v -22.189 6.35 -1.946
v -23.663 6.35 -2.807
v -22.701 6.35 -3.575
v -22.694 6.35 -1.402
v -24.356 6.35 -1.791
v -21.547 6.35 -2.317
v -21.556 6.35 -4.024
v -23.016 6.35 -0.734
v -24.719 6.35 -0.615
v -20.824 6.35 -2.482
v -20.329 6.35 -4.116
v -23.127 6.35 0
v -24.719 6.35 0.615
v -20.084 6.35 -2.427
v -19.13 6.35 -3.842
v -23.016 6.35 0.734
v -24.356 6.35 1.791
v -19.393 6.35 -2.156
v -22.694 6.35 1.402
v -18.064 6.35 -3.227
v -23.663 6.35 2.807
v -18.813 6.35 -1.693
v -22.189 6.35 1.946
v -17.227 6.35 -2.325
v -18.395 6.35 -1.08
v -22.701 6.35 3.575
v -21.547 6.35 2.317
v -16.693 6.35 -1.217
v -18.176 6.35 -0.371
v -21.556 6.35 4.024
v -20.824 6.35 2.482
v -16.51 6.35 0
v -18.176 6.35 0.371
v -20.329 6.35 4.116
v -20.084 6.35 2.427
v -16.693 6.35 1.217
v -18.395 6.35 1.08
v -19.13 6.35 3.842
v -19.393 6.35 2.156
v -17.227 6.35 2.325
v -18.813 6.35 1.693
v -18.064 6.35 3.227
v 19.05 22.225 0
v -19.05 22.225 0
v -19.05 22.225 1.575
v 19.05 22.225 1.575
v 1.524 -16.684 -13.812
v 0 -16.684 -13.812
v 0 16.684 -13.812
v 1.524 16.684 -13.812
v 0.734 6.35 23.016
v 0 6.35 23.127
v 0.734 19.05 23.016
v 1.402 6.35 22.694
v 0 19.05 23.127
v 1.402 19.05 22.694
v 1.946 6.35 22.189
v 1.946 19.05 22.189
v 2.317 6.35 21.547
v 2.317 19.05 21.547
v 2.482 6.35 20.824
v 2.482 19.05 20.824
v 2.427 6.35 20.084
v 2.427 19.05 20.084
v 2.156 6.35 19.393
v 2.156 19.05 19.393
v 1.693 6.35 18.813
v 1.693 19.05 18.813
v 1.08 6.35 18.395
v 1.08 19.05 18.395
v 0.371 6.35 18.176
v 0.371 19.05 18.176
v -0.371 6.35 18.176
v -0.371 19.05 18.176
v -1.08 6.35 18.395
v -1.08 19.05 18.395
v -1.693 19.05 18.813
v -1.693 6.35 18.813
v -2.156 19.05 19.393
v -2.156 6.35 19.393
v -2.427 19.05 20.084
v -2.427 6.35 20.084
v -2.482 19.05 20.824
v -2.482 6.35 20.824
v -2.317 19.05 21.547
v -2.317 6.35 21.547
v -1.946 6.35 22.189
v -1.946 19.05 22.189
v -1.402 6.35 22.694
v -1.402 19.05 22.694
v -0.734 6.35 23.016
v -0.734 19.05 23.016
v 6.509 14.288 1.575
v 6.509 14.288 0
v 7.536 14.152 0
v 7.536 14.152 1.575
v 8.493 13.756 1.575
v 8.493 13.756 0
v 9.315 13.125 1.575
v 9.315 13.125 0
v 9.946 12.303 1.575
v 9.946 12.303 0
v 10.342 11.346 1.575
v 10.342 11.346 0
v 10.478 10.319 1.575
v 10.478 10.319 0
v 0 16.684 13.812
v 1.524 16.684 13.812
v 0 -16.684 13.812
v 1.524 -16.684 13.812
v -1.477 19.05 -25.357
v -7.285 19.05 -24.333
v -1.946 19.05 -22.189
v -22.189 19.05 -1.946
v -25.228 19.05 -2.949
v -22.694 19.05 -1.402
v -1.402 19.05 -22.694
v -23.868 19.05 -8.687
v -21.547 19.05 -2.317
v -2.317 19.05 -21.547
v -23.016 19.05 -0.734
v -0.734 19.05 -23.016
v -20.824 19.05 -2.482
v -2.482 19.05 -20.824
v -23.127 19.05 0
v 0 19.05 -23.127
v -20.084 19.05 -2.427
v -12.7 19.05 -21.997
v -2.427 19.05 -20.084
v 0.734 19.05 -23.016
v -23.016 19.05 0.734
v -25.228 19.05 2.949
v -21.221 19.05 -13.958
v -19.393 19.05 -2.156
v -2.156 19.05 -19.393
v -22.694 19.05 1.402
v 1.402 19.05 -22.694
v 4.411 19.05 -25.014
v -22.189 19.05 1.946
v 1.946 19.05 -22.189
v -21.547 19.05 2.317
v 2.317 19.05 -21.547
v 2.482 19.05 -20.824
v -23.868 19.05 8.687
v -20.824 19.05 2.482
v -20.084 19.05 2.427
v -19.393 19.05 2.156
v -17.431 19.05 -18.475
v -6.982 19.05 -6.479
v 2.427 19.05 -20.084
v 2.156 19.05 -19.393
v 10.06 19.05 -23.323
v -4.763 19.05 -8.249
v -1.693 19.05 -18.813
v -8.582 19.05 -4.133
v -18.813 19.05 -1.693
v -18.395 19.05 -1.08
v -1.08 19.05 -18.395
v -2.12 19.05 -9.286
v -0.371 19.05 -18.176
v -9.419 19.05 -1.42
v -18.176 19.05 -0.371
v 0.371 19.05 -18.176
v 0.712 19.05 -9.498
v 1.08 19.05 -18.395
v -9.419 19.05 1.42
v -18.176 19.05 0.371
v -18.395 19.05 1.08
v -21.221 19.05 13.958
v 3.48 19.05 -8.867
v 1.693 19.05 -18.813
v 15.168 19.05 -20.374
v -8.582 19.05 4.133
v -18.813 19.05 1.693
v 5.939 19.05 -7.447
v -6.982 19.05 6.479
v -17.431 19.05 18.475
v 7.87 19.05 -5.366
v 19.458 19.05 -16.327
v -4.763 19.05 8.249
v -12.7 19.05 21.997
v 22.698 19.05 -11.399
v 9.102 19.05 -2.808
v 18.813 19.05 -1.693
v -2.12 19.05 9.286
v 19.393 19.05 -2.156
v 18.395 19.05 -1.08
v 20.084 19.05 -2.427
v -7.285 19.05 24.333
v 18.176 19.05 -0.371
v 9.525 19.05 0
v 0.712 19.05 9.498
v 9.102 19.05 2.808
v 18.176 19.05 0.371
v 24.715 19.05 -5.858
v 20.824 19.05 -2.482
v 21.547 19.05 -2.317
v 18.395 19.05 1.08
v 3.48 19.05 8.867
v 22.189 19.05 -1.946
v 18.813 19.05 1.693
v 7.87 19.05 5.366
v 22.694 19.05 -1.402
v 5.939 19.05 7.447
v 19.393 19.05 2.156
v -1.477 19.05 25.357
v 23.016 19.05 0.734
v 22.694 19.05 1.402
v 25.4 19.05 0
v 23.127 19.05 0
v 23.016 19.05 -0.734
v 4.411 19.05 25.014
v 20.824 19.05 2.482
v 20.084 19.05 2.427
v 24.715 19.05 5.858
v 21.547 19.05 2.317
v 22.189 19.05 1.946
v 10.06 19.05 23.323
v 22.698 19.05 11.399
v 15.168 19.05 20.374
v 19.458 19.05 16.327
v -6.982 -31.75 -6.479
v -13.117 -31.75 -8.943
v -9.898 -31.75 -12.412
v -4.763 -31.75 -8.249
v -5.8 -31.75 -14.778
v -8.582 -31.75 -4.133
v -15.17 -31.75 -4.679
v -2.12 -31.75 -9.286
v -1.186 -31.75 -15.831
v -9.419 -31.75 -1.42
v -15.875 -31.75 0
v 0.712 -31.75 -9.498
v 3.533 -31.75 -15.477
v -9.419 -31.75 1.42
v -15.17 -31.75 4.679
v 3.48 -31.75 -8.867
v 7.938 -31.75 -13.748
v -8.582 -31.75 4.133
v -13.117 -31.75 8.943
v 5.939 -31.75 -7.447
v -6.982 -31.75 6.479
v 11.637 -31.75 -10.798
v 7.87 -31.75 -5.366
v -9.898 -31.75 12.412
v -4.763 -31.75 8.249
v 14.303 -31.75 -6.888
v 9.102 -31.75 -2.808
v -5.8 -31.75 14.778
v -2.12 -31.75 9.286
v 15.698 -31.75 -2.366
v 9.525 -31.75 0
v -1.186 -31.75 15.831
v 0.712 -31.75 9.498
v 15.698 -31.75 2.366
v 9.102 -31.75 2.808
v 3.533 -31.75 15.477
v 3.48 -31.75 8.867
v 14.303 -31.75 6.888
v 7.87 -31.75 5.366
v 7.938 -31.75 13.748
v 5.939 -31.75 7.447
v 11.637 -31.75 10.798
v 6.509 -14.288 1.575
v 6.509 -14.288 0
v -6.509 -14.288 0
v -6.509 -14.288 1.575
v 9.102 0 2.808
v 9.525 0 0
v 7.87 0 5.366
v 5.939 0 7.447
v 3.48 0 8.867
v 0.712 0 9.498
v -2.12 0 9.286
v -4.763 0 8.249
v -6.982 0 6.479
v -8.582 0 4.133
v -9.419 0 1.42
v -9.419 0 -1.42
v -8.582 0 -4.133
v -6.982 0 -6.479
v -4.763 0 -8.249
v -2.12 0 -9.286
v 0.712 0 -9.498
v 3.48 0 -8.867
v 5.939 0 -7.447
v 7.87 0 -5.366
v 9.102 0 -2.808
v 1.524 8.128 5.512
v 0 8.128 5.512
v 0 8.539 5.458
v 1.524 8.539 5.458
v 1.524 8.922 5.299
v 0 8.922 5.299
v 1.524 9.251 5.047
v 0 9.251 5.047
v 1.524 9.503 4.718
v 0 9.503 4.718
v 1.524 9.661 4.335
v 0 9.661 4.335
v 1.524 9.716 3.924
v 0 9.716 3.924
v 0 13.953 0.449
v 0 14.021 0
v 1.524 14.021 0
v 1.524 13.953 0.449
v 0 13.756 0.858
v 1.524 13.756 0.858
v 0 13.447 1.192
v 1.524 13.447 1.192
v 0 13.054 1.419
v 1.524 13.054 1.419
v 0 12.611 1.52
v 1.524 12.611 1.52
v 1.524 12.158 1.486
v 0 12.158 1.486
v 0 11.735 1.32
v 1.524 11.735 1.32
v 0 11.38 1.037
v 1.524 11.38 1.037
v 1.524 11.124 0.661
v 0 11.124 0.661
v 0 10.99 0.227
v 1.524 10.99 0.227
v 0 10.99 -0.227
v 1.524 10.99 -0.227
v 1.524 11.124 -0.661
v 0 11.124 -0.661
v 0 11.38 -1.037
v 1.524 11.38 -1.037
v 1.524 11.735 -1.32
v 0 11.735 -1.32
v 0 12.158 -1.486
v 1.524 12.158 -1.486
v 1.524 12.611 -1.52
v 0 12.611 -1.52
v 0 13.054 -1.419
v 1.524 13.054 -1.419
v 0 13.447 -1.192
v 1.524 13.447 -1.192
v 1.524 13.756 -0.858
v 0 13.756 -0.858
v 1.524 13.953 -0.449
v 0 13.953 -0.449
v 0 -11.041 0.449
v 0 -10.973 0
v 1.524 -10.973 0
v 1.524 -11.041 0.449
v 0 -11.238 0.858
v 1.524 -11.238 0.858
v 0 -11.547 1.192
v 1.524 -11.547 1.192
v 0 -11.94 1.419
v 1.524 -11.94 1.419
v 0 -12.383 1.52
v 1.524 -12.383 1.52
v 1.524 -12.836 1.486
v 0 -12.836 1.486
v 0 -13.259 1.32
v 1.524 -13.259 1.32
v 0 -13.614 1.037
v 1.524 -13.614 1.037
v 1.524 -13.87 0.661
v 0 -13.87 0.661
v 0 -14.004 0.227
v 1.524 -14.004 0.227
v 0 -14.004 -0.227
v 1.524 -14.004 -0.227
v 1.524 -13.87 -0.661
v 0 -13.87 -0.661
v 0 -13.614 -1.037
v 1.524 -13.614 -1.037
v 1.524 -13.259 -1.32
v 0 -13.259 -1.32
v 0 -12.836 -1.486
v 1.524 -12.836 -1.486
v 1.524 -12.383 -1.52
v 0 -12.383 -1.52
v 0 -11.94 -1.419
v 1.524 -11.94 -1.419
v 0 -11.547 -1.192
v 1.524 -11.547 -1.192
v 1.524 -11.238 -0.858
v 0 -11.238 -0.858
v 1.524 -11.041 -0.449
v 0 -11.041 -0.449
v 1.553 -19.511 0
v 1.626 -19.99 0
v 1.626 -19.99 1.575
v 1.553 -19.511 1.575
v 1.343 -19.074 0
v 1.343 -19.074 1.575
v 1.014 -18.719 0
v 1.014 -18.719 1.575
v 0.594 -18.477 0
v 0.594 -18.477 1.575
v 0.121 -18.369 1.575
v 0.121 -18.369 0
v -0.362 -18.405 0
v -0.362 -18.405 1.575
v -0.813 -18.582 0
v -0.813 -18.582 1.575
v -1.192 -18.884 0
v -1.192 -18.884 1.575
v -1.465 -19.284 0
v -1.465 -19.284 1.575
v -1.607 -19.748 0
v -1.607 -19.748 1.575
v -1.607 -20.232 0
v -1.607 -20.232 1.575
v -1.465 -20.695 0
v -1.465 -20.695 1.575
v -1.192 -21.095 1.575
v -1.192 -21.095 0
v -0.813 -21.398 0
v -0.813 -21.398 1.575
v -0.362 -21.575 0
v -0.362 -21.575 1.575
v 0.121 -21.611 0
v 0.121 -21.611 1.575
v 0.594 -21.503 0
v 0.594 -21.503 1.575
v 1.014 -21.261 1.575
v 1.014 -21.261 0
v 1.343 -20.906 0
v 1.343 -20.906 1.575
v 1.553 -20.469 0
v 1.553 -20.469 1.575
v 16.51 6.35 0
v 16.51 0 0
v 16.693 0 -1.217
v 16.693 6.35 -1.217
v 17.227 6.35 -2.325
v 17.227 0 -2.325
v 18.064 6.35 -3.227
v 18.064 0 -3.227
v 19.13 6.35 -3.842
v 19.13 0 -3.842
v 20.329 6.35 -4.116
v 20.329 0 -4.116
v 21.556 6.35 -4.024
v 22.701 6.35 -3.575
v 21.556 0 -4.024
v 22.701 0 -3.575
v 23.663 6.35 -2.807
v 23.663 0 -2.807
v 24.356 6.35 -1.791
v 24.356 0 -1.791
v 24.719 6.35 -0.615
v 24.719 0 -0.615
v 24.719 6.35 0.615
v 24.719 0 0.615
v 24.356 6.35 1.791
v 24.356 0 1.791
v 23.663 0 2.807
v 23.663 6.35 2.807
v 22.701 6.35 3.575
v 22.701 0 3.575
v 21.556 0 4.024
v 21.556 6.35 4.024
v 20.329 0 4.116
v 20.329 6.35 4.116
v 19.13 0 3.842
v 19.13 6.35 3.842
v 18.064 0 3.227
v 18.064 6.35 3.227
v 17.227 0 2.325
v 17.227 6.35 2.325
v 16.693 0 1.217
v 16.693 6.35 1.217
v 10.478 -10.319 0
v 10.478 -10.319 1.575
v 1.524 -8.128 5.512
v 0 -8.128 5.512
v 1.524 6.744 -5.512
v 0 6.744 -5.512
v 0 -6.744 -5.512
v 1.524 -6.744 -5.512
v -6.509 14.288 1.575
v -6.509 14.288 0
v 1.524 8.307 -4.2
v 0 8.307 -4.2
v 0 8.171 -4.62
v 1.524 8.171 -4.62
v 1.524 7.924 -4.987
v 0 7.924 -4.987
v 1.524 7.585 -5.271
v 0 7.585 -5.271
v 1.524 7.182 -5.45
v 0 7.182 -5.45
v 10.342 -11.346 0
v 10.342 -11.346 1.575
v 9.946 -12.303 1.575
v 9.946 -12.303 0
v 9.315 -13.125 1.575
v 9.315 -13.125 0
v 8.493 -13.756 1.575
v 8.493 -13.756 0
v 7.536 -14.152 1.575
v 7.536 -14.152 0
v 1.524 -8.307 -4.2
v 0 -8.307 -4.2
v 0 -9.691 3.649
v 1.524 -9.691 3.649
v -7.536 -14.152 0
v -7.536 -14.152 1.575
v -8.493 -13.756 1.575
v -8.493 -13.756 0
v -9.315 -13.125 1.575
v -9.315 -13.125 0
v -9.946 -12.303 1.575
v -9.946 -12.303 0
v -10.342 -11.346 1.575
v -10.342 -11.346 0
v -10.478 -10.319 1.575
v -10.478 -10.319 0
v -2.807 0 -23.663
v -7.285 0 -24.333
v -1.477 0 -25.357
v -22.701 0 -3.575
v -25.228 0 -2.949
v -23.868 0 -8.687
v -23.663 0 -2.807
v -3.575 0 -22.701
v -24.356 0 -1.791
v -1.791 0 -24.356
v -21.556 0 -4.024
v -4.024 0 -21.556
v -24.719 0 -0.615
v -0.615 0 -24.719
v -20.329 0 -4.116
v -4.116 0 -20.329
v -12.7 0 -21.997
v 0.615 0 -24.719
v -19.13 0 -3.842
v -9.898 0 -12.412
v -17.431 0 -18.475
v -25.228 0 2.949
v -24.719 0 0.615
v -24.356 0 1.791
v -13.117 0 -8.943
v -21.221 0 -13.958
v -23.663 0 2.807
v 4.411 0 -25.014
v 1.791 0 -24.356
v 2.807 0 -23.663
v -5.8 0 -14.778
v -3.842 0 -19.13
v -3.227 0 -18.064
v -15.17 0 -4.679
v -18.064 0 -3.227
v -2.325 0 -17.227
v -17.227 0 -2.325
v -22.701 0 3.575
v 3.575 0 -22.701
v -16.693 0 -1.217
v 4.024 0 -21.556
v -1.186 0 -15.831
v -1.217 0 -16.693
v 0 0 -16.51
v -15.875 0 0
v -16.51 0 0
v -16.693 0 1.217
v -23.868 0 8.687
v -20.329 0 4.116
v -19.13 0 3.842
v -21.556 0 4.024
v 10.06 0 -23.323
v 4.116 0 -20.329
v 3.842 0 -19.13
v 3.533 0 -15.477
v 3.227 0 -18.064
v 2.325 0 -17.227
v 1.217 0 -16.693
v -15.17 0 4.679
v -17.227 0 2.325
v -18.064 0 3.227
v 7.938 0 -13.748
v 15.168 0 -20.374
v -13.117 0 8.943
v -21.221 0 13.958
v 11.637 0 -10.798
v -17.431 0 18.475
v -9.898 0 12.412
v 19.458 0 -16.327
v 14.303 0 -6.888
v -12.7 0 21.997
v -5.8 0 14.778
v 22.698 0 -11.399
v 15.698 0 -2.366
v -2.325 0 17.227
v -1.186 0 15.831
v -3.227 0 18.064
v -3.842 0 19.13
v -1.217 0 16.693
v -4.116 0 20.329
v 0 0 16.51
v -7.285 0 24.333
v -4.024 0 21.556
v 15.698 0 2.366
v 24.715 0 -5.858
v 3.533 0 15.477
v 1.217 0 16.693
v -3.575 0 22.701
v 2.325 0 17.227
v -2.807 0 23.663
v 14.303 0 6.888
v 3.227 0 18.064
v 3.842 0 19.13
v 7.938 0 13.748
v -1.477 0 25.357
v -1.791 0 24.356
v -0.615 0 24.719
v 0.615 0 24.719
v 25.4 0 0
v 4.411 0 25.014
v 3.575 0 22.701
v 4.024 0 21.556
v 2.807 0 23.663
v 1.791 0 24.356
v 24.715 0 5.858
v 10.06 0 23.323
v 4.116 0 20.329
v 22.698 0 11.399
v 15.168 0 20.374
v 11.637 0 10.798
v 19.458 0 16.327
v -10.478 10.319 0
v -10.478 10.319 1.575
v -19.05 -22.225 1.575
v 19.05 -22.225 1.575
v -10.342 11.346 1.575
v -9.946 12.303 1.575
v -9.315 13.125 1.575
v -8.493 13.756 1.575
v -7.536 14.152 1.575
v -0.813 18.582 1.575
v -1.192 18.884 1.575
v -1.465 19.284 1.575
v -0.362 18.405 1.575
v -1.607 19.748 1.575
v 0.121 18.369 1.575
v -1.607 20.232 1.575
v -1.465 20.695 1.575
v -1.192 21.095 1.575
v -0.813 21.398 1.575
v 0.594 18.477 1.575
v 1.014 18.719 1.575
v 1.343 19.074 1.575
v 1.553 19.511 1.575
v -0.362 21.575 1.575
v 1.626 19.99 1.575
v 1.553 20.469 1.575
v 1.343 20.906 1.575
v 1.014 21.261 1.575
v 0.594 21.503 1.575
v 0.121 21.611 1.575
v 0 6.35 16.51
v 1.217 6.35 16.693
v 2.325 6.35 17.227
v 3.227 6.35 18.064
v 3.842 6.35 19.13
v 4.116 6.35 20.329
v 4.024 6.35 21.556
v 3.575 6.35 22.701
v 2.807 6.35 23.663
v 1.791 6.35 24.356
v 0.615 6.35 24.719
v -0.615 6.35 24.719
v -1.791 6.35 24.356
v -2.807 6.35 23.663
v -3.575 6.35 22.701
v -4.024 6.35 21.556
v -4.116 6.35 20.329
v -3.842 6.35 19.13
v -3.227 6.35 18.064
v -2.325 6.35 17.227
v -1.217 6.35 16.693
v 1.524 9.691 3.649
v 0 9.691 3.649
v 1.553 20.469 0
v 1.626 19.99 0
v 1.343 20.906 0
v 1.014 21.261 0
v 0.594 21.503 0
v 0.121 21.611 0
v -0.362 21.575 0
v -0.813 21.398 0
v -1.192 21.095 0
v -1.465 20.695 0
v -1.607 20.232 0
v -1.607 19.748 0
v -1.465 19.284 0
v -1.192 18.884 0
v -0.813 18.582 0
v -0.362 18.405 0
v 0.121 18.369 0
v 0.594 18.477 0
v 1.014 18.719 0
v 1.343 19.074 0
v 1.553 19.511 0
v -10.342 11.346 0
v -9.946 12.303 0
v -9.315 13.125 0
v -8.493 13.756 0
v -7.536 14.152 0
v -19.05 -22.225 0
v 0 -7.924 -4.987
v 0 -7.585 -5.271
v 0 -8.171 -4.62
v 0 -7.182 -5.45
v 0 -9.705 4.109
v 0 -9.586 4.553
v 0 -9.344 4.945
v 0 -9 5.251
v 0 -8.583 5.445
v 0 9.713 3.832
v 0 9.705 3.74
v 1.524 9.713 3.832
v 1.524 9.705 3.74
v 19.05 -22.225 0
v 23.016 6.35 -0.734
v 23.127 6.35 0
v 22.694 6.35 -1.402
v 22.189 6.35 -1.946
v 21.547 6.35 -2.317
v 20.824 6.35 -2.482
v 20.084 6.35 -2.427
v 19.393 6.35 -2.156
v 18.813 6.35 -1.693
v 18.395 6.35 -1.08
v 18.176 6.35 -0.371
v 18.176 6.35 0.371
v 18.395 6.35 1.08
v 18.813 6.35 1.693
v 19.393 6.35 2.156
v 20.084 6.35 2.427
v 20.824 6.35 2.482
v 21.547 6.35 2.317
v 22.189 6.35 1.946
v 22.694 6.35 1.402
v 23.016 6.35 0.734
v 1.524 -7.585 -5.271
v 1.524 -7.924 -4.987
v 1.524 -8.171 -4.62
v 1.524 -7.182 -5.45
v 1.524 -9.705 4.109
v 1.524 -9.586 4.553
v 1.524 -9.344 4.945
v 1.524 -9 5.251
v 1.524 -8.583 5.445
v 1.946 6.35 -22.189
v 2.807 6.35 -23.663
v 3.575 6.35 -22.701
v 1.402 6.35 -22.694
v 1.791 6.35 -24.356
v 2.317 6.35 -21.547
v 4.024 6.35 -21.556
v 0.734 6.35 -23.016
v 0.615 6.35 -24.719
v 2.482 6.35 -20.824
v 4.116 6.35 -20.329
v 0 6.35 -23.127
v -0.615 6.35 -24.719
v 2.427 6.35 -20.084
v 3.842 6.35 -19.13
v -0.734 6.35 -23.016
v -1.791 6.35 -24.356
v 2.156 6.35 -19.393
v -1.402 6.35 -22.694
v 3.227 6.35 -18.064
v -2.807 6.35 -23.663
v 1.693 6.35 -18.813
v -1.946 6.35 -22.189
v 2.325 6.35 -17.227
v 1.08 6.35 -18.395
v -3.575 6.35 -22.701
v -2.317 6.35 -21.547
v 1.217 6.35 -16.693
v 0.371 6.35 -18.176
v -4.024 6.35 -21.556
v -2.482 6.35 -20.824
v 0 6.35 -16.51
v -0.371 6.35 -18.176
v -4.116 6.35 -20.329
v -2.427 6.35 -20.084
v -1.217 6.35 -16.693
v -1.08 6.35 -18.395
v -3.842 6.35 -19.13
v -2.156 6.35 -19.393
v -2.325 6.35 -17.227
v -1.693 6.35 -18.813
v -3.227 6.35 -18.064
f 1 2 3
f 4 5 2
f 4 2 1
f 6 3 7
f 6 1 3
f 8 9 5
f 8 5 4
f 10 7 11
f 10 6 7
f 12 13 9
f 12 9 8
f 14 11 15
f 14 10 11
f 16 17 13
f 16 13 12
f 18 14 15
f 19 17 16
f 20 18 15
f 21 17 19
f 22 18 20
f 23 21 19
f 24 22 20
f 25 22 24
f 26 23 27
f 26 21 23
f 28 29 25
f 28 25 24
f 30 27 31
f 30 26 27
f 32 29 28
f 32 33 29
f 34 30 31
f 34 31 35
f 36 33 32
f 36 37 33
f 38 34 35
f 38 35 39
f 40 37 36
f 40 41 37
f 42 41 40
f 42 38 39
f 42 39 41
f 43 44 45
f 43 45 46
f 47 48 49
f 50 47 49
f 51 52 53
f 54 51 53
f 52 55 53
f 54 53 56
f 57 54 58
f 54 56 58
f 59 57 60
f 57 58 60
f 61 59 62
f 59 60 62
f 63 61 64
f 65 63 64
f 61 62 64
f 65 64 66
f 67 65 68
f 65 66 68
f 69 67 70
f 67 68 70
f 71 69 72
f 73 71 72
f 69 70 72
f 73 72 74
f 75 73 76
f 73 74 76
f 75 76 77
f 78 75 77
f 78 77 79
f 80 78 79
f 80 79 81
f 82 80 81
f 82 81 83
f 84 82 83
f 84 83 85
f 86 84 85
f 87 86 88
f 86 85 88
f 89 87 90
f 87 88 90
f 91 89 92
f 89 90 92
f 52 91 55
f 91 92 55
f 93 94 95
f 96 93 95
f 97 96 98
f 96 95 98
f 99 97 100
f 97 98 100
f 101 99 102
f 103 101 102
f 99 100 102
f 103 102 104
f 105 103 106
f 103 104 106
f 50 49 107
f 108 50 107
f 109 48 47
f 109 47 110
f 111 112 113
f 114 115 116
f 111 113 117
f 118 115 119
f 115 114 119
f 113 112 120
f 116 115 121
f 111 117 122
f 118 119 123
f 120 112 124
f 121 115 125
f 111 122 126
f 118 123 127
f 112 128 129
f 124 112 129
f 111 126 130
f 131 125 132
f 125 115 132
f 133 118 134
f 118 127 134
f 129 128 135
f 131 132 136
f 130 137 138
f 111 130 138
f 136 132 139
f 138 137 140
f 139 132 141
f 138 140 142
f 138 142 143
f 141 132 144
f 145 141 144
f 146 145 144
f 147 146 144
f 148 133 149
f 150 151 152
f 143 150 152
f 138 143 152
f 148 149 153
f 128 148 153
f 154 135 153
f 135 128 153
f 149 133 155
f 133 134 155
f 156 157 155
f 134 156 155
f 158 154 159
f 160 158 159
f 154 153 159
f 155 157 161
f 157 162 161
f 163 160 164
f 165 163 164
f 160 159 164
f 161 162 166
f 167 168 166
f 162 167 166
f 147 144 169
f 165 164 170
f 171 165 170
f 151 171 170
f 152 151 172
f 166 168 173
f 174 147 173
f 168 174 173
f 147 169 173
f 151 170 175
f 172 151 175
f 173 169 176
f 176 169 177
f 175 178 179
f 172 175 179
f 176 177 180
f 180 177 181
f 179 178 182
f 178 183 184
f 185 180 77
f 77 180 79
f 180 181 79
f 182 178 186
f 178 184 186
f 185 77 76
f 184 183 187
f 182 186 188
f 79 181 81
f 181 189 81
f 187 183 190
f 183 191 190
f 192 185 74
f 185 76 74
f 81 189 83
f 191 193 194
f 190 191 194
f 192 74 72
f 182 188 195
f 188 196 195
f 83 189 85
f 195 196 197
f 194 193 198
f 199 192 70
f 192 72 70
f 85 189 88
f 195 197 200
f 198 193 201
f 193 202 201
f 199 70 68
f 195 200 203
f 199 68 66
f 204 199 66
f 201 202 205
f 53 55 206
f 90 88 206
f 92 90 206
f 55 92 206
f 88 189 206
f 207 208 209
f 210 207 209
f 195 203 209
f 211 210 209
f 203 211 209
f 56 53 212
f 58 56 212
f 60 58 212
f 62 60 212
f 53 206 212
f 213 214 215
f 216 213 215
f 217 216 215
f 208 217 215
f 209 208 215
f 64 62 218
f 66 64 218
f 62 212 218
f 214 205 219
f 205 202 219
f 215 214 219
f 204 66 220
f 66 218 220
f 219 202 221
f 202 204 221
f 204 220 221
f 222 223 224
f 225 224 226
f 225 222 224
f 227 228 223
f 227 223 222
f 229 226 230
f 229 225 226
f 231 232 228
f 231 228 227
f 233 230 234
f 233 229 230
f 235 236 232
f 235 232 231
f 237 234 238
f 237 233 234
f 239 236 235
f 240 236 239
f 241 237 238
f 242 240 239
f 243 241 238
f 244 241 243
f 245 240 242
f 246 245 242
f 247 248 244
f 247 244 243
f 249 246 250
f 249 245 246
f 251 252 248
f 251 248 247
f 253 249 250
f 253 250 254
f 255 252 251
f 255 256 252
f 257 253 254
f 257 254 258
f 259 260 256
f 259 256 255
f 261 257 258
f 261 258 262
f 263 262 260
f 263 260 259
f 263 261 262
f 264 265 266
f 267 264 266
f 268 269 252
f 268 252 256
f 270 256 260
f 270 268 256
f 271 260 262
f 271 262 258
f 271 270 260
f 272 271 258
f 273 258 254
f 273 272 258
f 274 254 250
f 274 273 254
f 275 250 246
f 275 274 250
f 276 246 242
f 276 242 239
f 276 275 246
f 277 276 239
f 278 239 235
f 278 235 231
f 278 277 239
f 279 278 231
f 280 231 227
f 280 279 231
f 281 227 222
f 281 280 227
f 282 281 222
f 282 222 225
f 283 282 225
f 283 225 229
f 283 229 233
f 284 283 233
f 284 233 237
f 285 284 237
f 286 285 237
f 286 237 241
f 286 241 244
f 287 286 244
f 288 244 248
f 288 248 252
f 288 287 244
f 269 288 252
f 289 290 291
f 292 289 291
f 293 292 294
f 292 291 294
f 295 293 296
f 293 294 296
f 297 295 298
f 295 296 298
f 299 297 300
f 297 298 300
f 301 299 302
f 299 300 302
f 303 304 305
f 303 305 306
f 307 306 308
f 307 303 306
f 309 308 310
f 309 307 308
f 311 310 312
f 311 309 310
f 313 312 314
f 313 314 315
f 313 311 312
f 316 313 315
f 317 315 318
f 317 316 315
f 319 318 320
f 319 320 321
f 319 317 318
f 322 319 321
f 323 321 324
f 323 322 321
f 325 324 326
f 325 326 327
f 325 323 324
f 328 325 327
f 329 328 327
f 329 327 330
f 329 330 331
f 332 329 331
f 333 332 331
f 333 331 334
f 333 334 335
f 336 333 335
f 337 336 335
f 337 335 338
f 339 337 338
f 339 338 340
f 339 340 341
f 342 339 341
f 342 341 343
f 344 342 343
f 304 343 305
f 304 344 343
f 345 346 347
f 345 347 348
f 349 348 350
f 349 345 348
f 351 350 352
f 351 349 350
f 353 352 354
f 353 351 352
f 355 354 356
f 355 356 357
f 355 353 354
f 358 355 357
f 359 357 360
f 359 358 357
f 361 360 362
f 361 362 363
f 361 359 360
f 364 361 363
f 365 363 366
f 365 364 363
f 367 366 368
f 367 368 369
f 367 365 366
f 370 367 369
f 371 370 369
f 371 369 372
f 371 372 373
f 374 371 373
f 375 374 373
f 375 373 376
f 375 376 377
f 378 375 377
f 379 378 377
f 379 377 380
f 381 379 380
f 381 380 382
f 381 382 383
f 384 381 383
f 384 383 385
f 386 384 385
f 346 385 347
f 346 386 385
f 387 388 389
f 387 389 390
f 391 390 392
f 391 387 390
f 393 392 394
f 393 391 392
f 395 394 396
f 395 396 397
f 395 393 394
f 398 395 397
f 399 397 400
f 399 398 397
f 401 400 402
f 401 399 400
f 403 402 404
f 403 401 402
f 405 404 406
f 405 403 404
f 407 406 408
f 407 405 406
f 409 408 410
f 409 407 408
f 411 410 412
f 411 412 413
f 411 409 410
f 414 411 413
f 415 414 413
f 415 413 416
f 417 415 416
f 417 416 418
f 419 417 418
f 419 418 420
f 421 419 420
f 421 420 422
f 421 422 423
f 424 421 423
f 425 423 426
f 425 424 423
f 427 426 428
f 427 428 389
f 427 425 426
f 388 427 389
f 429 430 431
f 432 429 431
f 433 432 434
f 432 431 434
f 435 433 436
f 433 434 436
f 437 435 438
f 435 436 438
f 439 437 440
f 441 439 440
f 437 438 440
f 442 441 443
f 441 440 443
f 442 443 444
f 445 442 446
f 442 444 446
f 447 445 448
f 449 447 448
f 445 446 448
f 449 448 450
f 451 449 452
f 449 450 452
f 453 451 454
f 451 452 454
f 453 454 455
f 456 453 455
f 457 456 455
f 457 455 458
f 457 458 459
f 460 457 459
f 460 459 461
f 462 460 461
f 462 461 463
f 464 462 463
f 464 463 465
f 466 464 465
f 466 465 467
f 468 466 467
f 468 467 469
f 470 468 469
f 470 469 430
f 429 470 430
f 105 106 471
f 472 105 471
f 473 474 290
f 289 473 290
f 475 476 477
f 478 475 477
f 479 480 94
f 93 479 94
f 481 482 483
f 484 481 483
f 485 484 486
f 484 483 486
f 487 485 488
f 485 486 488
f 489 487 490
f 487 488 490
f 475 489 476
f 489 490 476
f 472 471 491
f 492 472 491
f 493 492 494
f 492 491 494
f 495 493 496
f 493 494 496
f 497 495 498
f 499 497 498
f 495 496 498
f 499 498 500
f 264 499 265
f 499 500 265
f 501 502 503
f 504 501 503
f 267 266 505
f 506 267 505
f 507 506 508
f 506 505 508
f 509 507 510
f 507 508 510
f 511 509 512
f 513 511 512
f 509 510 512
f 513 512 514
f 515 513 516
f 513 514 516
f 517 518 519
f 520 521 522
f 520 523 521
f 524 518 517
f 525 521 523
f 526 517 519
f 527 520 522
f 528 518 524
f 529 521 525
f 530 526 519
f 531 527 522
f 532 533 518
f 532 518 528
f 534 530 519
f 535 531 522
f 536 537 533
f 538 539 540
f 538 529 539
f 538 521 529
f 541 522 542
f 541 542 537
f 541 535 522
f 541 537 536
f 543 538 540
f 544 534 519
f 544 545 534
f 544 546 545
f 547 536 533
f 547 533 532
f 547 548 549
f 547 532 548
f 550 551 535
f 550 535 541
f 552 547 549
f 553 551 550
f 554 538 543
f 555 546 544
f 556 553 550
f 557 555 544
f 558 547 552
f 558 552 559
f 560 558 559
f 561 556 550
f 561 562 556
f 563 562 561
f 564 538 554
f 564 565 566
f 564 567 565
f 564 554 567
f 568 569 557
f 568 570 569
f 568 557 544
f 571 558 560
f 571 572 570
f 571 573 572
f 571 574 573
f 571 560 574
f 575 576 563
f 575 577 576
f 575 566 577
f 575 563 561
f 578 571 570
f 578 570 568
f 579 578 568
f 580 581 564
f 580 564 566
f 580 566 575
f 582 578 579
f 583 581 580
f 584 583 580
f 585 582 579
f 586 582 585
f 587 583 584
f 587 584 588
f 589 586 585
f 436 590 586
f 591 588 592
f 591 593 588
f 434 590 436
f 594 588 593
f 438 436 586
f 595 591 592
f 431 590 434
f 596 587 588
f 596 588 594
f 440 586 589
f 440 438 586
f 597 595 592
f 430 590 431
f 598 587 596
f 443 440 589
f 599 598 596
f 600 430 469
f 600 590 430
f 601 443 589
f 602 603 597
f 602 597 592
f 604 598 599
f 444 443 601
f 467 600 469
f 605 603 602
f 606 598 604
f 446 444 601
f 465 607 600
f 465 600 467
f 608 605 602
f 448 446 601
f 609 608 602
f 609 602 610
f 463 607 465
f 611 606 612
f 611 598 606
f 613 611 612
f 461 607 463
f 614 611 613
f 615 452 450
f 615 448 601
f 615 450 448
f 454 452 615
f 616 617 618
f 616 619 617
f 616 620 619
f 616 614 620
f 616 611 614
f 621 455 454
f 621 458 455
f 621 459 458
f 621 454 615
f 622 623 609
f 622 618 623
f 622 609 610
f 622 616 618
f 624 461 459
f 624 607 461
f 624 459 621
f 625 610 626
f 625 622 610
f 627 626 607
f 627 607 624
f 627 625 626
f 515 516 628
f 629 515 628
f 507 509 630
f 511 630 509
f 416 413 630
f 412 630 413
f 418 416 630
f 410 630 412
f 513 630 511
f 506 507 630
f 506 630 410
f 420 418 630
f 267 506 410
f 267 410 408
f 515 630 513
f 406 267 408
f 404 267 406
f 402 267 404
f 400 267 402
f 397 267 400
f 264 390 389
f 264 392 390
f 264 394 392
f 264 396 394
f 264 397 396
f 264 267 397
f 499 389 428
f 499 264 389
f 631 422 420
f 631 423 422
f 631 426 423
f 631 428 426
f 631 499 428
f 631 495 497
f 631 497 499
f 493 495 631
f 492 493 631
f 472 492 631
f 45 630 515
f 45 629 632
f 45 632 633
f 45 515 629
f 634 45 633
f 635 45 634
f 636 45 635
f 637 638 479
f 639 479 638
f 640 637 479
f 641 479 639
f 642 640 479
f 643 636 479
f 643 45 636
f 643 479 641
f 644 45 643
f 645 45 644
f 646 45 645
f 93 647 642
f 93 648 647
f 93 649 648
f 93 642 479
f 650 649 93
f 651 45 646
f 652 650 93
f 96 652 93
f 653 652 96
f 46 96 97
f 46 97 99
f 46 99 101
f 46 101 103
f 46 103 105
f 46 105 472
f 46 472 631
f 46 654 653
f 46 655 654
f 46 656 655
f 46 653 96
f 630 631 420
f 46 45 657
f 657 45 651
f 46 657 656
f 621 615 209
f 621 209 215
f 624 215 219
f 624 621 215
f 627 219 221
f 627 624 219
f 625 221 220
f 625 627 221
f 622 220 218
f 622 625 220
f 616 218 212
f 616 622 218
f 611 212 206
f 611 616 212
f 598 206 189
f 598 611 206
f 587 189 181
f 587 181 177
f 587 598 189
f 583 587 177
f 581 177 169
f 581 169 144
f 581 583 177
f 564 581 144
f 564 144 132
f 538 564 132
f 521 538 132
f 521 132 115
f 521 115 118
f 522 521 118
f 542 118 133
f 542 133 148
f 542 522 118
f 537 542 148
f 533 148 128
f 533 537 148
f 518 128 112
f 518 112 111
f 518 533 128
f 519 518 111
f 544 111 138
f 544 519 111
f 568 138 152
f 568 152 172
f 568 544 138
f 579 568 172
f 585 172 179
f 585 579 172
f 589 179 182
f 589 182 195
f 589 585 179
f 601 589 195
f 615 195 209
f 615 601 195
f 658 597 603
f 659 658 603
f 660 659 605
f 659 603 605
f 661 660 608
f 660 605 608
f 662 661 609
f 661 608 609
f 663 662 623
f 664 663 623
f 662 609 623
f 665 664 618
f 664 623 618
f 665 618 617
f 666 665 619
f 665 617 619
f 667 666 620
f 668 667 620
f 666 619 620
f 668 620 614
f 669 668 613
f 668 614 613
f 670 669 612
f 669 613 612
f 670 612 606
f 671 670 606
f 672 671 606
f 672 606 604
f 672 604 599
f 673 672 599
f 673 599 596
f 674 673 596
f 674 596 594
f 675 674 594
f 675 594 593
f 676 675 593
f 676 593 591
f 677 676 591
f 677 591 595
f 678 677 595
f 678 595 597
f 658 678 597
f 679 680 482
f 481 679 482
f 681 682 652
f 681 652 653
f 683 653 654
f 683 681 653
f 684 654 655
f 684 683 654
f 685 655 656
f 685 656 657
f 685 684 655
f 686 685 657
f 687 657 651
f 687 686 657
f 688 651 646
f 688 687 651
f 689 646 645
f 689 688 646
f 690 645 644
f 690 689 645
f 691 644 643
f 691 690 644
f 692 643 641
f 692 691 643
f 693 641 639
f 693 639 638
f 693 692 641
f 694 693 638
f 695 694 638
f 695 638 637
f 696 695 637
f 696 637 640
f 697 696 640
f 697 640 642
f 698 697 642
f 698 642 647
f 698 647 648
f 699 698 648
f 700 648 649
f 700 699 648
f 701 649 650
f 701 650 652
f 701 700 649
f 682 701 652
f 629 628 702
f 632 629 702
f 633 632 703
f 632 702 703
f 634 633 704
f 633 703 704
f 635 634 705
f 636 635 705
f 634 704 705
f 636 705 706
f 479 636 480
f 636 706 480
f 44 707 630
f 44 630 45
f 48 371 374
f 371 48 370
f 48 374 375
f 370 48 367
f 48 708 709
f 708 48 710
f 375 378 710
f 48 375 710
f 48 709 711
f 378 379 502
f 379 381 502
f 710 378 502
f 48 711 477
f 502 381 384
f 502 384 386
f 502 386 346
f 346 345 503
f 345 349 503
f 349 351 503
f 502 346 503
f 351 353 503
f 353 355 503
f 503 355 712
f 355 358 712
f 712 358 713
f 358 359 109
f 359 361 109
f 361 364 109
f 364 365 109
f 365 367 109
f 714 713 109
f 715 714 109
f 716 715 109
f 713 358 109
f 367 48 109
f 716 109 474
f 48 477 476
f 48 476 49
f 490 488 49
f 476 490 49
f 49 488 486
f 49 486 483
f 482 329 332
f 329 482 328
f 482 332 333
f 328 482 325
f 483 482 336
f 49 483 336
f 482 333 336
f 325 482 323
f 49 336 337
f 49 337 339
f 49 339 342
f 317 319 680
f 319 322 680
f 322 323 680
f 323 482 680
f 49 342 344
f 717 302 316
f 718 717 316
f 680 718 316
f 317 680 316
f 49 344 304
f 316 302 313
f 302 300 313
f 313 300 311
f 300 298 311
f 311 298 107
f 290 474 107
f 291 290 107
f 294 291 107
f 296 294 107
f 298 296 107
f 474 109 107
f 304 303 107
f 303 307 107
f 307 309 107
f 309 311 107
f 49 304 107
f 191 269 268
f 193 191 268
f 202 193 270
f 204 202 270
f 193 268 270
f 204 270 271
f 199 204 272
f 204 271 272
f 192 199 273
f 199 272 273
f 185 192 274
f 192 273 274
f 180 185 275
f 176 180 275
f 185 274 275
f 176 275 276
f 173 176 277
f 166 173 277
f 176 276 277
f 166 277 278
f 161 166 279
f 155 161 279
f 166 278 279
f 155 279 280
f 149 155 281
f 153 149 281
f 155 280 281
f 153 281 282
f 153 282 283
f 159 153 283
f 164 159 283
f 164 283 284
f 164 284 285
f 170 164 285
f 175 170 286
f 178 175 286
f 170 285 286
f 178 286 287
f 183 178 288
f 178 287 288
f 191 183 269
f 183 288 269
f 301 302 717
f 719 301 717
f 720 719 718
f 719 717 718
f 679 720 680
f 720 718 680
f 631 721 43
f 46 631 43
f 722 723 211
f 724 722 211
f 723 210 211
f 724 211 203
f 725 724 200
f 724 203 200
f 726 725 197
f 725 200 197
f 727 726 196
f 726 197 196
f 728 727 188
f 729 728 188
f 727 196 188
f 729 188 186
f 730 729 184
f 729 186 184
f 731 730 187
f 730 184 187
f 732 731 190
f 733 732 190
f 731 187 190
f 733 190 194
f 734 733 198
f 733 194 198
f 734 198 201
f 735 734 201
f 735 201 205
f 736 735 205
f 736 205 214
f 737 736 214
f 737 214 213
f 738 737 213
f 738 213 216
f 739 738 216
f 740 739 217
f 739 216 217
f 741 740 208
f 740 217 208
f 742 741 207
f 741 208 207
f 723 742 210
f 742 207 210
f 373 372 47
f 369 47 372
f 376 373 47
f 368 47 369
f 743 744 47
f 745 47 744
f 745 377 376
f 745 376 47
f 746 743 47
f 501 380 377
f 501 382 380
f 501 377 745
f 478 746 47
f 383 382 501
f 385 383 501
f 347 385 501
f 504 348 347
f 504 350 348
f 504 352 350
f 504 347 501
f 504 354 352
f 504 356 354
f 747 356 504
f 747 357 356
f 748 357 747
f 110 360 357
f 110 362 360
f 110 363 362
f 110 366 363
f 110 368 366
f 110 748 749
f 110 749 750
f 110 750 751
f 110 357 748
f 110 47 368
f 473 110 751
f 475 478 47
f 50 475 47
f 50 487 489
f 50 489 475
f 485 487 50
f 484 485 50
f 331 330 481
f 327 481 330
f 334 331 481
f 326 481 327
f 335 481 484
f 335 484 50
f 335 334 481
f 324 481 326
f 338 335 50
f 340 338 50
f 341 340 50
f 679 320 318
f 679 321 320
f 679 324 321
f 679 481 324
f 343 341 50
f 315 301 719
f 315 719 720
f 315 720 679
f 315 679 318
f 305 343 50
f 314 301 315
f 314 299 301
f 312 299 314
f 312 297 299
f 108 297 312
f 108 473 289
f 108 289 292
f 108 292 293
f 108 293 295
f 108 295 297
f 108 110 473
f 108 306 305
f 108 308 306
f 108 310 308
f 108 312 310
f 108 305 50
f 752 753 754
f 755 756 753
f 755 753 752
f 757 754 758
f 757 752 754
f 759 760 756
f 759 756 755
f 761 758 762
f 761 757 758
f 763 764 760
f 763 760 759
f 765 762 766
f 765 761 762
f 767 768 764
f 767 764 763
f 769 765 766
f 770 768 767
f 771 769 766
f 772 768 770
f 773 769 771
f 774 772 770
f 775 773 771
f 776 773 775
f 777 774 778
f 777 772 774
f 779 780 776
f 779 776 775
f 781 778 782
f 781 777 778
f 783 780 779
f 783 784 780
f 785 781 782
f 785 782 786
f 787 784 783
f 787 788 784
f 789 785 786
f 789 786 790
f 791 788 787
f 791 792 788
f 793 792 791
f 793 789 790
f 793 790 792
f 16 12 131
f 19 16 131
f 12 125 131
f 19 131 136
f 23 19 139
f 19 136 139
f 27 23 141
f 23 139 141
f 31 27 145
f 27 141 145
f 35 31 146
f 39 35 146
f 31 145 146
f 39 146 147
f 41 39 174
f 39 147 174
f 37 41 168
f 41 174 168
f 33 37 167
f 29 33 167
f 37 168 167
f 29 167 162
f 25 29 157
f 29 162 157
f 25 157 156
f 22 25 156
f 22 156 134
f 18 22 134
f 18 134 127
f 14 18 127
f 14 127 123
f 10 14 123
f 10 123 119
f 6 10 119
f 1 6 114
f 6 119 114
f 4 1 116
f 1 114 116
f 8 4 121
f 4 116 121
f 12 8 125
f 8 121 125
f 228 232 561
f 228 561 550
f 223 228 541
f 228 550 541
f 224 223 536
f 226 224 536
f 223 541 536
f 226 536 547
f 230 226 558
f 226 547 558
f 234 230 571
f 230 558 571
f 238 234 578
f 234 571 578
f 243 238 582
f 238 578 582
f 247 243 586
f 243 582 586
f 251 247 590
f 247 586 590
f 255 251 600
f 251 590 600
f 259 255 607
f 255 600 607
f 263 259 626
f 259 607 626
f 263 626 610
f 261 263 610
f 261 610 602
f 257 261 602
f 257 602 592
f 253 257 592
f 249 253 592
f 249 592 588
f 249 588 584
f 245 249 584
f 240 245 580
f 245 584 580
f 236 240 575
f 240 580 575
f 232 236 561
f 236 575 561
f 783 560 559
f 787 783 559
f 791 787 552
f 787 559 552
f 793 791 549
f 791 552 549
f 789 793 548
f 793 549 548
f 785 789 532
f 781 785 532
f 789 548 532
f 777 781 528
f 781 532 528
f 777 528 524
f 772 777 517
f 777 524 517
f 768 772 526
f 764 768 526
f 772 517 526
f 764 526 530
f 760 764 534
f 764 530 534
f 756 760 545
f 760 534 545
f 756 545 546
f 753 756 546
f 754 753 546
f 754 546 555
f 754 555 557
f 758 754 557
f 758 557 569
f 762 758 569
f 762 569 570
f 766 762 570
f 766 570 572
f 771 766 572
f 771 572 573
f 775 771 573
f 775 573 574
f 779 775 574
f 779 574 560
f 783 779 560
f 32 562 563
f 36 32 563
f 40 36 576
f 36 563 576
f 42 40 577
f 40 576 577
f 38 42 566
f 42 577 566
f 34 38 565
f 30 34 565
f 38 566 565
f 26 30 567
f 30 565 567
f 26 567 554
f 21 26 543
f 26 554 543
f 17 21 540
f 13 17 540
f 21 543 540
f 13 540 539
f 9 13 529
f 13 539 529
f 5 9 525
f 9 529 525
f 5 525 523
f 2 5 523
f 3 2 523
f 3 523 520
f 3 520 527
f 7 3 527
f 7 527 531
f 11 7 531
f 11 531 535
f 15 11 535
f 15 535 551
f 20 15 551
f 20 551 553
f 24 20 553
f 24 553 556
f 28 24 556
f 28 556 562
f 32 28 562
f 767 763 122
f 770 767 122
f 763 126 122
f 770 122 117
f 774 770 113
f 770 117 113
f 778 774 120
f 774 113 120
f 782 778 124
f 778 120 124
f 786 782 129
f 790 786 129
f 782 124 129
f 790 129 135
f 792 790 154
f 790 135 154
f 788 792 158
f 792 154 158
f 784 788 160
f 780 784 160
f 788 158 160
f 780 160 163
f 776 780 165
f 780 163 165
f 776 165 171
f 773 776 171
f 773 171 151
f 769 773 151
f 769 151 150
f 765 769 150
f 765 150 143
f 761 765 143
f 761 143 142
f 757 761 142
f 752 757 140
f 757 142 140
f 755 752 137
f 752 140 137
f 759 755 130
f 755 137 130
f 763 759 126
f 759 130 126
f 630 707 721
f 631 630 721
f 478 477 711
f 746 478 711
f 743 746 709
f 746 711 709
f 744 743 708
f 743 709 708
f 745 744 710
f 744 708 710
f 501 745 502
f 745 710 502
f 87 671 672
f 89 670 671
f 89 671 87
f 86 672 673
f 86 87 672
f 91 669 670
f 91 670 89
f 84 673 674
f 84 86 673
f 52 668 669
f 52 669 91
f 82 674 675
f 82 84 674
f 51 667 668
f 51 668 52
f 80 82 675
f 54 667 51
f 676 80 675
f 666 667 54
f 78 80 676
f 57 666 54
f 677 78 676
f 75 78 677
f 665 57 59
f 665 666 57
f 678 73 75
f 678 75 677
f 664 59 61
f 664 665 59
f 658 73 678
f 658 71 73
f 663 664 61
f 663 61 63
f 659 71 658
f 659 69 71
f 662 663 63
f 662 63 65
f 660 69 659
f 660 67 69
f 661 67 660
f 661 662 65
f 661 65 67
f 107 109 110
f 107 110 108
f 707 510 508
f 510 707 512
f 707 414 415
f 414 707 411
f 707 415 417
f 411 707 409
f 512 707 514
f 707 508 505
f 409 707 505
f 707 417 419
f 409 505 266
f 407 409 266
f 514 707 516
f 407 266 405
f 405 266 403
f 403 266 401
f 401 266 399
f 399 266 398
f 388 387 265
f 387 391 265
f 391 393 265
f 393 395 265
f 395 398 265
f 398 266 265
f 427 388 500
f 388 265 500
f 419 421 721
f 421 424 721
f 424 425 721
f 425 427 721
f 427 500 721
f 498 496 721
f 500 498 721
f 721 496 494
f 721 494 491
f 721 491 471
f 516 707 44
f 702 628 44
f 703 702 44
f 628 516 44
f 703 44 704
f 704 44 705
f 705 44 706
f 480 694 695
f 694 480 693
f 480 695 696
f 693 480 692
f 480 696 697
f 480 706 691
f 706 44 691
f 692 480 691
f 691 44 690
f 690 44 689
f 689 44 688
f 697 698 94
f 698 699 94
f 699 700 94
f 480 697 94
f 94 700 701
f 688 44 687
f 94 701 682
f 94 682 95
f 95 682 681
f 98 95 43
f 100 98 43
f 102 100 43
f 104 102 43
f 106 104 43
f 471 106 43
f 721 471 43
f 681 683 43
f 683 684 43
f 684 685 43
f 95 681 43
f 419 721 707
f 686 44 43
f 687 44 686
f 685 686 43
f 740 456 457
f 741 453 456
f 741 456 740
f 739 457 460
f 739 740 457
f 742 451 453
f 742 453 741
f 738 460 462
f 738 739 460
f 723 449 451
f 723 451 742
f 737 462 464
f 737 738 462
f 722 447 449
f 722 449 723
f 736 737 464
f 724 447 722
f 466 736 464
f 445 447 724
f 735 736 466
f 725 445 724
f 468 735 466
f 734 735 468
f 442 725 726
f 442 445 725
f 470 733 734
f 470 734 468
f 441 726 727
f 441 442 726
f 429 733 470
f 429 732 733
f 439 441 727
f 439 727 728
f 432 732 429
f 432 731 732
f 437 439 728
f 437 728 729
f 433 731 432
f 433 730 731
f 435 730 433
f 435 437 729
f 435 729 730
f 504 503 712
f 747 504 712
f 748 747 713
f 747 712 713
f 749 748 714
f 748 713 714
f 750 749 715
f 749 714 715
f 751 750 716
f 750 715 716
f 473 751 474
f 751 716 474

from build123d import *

# Parameters (mm, degrees)
F0_R            = 9.525
F1_DEPTH        = 31.75
F2_DEPTH        = 19.05
F3_D            = 4.9784
F3_CBORE_D      = 8.255
F3_CBORE_DEPTH  = 6.35
F3_COPIES_COUNT = 4
F4_W            = 33.3682782948
F4_H            = 27.6242401451
F4_R            = 1.524
F5_DEPTH        = 1.524
F6_W            = 38.1
F6_H            = 44.45
F6_R            = 1.6256
F7_DEPTH        = 1.5748


# Not quite as in the source:
# - a pattern or mirror of a feature is missing from the dataset's text; its kind, count and spacing are read off the source's solid


with BuildPart() as f1:
    # F0 (on Front) → F1 (new body)
    with BuildSketch(Plane.XZ):
        with BuildLine():
            ThreePointArc((15.875, 0), (0, 15.875), (-15.875, 0))
            ThreePointArc((-15.875, 0), (0, -15.875), (15.875, 0))
        make_face()
        Circle(F0_R, mode=Mode.SUBTRACT)
    extrude(amount=F1_DEPTH)

    # F0 (on Front) → F2 (join)
    with BuildSketch(Plane.XZ):
        with BuildLine():
            ThreePointArc((-25.4, 0), (0, -25.4), (25.4, 0))
            ThreePointArc((25.4, 0), (0, 25.4), (-25.4, 0))
        make_face()
        with BuildLine():
            ThreePointArc((15.875, 0), (0, -15.875), (-15.875, 0))
            ThreePointArc((-15.875, 0), (0, 15.875), (15.875, 0))
        make_face(mode=Mode.SUBTRACT)
        with BuildLine():
            ThreePointArc((15.875, 0), (0, 15.875), (-15.875, 0))
            ThreePointArc((-15.875, 0), (0, -15.875), (15.875, 0))
        make_face()
        Circle(F0_R, mode=Mode.SUBTRACT)
    extrude(amount=-F2_DEPTH)

    # F3 (through all)
    with Locations(Plane.XZ):
        with Locations((-20.6375, 0)):
            f3 = CounterBoreHole(F3_D / 2, F3_CBORE_D / 2, F3_CBORE_DEPTH)

    # F3_copies: F3 ×4 about axis
    f3_copies_axis = Axis((0, 0, 0), (0, 1, 0))
    for i in range(1, F3_COPIES_COUNT):
        add(f3.rotate(f3_copies_axis, i * 360 / F3_COPIES_COUNT), mode=Mode.SUBTRACT)


with BuildPart() as f5:
    # F4 (on Right) → F5 (new body)
    with BuildSketch(Plane.YZ):
        Rectangle(F4_W, F4_H)
        with Locations((-12.4968, 0)):
            Circle(F4_R, mode=Mode.SUBTRACT)
        with BuildLine():
            ThreePointArc((-9.6913823079, 3.648633518), (-9.3440955535, 4.9447253304), (-8.128, 5.5118))
            Line((-8.128, 5.5118), (8.128, 5.5118))
            ThreePointArc((8.128, 5.5118), (9.2505320151, 5.0468320151), (9.7155, 3.9243))
            ThreePointArc((9.7155, 3.9243), (9.7094590832, 3.7859402584), (9.6913823079, 3.648633518))
            Line((9.6913823079, 3.648633518), (8.3074623671, -4.199966482))
            ThreePointArc((8.3074623671, -4.199966482), (7.7645053896, -5.1403955535), (6.7440800592, -5.5118))
            Line((6.7440800592, -5.5118), (-6.7440800592, -5.5118))
            ThreePointArc((-6.7440800592, -5.5118), (-7.7645053896, -5.1403955535), (-8.3074623671, -4.199966482))
            Line((-8.3074623671, -4.199966482), (-9.6913823079, 3.648633518))
        make_face(mode=Mode.SUBTRACT)
        with Locations((12.4968, 0)):
            Circle(F4_R, mode=Mode.SUBTRACT)
    extrude(amount=F5_DEPTH)


with BuildPart() as f7:
    # F6 (on Top) → F7 (new body)
    with BuildSketch(Plane.XY):
        Rectangle(F6_W, F6_H)
        with Locations((0, -19.9898)):
            Circle(F6_R, mode=Mode.SUBTRACT)
        with BuildLine():
            Line((-6.50875, 14.2875), (6.50875, 14.2875))
            ThreePointArc((6.50875, 14.2875), (9.3150800378, 13.1250800378), (10.4775, 10.31875))
            Line((10.4775, 10.31875), (10.4775, -10.31875))
            ThreePointArc((10.4775, -10.31875), (9.3150800378, -13.1250800378), (6.50875, -14.2875))
            Line((6.50875, -14.2875), (-6.50875, -14.2875))
            ThreePointArc((-6.50875, -14.2875), (-9.3150800378, -13.1250800378), (-10.4775, -10.31875))
            Line((-10.4775, -10.31875), (-10.4775, 10.31875))
            ThreePointArc((-10.4775, 10.31875), (-9.3150800378, 13.1250800378), (-6.50875, 14.2875))
        make_face(mode=Mode.SUBTRACT)
        with Locations((0, 19.9898)):
            Circle(F6_R, mode=Mode.SUBTRACT)
    extrude(amount=F7_DEPTH)


solid = Compound([f1.part, f5.part, f7.part])
